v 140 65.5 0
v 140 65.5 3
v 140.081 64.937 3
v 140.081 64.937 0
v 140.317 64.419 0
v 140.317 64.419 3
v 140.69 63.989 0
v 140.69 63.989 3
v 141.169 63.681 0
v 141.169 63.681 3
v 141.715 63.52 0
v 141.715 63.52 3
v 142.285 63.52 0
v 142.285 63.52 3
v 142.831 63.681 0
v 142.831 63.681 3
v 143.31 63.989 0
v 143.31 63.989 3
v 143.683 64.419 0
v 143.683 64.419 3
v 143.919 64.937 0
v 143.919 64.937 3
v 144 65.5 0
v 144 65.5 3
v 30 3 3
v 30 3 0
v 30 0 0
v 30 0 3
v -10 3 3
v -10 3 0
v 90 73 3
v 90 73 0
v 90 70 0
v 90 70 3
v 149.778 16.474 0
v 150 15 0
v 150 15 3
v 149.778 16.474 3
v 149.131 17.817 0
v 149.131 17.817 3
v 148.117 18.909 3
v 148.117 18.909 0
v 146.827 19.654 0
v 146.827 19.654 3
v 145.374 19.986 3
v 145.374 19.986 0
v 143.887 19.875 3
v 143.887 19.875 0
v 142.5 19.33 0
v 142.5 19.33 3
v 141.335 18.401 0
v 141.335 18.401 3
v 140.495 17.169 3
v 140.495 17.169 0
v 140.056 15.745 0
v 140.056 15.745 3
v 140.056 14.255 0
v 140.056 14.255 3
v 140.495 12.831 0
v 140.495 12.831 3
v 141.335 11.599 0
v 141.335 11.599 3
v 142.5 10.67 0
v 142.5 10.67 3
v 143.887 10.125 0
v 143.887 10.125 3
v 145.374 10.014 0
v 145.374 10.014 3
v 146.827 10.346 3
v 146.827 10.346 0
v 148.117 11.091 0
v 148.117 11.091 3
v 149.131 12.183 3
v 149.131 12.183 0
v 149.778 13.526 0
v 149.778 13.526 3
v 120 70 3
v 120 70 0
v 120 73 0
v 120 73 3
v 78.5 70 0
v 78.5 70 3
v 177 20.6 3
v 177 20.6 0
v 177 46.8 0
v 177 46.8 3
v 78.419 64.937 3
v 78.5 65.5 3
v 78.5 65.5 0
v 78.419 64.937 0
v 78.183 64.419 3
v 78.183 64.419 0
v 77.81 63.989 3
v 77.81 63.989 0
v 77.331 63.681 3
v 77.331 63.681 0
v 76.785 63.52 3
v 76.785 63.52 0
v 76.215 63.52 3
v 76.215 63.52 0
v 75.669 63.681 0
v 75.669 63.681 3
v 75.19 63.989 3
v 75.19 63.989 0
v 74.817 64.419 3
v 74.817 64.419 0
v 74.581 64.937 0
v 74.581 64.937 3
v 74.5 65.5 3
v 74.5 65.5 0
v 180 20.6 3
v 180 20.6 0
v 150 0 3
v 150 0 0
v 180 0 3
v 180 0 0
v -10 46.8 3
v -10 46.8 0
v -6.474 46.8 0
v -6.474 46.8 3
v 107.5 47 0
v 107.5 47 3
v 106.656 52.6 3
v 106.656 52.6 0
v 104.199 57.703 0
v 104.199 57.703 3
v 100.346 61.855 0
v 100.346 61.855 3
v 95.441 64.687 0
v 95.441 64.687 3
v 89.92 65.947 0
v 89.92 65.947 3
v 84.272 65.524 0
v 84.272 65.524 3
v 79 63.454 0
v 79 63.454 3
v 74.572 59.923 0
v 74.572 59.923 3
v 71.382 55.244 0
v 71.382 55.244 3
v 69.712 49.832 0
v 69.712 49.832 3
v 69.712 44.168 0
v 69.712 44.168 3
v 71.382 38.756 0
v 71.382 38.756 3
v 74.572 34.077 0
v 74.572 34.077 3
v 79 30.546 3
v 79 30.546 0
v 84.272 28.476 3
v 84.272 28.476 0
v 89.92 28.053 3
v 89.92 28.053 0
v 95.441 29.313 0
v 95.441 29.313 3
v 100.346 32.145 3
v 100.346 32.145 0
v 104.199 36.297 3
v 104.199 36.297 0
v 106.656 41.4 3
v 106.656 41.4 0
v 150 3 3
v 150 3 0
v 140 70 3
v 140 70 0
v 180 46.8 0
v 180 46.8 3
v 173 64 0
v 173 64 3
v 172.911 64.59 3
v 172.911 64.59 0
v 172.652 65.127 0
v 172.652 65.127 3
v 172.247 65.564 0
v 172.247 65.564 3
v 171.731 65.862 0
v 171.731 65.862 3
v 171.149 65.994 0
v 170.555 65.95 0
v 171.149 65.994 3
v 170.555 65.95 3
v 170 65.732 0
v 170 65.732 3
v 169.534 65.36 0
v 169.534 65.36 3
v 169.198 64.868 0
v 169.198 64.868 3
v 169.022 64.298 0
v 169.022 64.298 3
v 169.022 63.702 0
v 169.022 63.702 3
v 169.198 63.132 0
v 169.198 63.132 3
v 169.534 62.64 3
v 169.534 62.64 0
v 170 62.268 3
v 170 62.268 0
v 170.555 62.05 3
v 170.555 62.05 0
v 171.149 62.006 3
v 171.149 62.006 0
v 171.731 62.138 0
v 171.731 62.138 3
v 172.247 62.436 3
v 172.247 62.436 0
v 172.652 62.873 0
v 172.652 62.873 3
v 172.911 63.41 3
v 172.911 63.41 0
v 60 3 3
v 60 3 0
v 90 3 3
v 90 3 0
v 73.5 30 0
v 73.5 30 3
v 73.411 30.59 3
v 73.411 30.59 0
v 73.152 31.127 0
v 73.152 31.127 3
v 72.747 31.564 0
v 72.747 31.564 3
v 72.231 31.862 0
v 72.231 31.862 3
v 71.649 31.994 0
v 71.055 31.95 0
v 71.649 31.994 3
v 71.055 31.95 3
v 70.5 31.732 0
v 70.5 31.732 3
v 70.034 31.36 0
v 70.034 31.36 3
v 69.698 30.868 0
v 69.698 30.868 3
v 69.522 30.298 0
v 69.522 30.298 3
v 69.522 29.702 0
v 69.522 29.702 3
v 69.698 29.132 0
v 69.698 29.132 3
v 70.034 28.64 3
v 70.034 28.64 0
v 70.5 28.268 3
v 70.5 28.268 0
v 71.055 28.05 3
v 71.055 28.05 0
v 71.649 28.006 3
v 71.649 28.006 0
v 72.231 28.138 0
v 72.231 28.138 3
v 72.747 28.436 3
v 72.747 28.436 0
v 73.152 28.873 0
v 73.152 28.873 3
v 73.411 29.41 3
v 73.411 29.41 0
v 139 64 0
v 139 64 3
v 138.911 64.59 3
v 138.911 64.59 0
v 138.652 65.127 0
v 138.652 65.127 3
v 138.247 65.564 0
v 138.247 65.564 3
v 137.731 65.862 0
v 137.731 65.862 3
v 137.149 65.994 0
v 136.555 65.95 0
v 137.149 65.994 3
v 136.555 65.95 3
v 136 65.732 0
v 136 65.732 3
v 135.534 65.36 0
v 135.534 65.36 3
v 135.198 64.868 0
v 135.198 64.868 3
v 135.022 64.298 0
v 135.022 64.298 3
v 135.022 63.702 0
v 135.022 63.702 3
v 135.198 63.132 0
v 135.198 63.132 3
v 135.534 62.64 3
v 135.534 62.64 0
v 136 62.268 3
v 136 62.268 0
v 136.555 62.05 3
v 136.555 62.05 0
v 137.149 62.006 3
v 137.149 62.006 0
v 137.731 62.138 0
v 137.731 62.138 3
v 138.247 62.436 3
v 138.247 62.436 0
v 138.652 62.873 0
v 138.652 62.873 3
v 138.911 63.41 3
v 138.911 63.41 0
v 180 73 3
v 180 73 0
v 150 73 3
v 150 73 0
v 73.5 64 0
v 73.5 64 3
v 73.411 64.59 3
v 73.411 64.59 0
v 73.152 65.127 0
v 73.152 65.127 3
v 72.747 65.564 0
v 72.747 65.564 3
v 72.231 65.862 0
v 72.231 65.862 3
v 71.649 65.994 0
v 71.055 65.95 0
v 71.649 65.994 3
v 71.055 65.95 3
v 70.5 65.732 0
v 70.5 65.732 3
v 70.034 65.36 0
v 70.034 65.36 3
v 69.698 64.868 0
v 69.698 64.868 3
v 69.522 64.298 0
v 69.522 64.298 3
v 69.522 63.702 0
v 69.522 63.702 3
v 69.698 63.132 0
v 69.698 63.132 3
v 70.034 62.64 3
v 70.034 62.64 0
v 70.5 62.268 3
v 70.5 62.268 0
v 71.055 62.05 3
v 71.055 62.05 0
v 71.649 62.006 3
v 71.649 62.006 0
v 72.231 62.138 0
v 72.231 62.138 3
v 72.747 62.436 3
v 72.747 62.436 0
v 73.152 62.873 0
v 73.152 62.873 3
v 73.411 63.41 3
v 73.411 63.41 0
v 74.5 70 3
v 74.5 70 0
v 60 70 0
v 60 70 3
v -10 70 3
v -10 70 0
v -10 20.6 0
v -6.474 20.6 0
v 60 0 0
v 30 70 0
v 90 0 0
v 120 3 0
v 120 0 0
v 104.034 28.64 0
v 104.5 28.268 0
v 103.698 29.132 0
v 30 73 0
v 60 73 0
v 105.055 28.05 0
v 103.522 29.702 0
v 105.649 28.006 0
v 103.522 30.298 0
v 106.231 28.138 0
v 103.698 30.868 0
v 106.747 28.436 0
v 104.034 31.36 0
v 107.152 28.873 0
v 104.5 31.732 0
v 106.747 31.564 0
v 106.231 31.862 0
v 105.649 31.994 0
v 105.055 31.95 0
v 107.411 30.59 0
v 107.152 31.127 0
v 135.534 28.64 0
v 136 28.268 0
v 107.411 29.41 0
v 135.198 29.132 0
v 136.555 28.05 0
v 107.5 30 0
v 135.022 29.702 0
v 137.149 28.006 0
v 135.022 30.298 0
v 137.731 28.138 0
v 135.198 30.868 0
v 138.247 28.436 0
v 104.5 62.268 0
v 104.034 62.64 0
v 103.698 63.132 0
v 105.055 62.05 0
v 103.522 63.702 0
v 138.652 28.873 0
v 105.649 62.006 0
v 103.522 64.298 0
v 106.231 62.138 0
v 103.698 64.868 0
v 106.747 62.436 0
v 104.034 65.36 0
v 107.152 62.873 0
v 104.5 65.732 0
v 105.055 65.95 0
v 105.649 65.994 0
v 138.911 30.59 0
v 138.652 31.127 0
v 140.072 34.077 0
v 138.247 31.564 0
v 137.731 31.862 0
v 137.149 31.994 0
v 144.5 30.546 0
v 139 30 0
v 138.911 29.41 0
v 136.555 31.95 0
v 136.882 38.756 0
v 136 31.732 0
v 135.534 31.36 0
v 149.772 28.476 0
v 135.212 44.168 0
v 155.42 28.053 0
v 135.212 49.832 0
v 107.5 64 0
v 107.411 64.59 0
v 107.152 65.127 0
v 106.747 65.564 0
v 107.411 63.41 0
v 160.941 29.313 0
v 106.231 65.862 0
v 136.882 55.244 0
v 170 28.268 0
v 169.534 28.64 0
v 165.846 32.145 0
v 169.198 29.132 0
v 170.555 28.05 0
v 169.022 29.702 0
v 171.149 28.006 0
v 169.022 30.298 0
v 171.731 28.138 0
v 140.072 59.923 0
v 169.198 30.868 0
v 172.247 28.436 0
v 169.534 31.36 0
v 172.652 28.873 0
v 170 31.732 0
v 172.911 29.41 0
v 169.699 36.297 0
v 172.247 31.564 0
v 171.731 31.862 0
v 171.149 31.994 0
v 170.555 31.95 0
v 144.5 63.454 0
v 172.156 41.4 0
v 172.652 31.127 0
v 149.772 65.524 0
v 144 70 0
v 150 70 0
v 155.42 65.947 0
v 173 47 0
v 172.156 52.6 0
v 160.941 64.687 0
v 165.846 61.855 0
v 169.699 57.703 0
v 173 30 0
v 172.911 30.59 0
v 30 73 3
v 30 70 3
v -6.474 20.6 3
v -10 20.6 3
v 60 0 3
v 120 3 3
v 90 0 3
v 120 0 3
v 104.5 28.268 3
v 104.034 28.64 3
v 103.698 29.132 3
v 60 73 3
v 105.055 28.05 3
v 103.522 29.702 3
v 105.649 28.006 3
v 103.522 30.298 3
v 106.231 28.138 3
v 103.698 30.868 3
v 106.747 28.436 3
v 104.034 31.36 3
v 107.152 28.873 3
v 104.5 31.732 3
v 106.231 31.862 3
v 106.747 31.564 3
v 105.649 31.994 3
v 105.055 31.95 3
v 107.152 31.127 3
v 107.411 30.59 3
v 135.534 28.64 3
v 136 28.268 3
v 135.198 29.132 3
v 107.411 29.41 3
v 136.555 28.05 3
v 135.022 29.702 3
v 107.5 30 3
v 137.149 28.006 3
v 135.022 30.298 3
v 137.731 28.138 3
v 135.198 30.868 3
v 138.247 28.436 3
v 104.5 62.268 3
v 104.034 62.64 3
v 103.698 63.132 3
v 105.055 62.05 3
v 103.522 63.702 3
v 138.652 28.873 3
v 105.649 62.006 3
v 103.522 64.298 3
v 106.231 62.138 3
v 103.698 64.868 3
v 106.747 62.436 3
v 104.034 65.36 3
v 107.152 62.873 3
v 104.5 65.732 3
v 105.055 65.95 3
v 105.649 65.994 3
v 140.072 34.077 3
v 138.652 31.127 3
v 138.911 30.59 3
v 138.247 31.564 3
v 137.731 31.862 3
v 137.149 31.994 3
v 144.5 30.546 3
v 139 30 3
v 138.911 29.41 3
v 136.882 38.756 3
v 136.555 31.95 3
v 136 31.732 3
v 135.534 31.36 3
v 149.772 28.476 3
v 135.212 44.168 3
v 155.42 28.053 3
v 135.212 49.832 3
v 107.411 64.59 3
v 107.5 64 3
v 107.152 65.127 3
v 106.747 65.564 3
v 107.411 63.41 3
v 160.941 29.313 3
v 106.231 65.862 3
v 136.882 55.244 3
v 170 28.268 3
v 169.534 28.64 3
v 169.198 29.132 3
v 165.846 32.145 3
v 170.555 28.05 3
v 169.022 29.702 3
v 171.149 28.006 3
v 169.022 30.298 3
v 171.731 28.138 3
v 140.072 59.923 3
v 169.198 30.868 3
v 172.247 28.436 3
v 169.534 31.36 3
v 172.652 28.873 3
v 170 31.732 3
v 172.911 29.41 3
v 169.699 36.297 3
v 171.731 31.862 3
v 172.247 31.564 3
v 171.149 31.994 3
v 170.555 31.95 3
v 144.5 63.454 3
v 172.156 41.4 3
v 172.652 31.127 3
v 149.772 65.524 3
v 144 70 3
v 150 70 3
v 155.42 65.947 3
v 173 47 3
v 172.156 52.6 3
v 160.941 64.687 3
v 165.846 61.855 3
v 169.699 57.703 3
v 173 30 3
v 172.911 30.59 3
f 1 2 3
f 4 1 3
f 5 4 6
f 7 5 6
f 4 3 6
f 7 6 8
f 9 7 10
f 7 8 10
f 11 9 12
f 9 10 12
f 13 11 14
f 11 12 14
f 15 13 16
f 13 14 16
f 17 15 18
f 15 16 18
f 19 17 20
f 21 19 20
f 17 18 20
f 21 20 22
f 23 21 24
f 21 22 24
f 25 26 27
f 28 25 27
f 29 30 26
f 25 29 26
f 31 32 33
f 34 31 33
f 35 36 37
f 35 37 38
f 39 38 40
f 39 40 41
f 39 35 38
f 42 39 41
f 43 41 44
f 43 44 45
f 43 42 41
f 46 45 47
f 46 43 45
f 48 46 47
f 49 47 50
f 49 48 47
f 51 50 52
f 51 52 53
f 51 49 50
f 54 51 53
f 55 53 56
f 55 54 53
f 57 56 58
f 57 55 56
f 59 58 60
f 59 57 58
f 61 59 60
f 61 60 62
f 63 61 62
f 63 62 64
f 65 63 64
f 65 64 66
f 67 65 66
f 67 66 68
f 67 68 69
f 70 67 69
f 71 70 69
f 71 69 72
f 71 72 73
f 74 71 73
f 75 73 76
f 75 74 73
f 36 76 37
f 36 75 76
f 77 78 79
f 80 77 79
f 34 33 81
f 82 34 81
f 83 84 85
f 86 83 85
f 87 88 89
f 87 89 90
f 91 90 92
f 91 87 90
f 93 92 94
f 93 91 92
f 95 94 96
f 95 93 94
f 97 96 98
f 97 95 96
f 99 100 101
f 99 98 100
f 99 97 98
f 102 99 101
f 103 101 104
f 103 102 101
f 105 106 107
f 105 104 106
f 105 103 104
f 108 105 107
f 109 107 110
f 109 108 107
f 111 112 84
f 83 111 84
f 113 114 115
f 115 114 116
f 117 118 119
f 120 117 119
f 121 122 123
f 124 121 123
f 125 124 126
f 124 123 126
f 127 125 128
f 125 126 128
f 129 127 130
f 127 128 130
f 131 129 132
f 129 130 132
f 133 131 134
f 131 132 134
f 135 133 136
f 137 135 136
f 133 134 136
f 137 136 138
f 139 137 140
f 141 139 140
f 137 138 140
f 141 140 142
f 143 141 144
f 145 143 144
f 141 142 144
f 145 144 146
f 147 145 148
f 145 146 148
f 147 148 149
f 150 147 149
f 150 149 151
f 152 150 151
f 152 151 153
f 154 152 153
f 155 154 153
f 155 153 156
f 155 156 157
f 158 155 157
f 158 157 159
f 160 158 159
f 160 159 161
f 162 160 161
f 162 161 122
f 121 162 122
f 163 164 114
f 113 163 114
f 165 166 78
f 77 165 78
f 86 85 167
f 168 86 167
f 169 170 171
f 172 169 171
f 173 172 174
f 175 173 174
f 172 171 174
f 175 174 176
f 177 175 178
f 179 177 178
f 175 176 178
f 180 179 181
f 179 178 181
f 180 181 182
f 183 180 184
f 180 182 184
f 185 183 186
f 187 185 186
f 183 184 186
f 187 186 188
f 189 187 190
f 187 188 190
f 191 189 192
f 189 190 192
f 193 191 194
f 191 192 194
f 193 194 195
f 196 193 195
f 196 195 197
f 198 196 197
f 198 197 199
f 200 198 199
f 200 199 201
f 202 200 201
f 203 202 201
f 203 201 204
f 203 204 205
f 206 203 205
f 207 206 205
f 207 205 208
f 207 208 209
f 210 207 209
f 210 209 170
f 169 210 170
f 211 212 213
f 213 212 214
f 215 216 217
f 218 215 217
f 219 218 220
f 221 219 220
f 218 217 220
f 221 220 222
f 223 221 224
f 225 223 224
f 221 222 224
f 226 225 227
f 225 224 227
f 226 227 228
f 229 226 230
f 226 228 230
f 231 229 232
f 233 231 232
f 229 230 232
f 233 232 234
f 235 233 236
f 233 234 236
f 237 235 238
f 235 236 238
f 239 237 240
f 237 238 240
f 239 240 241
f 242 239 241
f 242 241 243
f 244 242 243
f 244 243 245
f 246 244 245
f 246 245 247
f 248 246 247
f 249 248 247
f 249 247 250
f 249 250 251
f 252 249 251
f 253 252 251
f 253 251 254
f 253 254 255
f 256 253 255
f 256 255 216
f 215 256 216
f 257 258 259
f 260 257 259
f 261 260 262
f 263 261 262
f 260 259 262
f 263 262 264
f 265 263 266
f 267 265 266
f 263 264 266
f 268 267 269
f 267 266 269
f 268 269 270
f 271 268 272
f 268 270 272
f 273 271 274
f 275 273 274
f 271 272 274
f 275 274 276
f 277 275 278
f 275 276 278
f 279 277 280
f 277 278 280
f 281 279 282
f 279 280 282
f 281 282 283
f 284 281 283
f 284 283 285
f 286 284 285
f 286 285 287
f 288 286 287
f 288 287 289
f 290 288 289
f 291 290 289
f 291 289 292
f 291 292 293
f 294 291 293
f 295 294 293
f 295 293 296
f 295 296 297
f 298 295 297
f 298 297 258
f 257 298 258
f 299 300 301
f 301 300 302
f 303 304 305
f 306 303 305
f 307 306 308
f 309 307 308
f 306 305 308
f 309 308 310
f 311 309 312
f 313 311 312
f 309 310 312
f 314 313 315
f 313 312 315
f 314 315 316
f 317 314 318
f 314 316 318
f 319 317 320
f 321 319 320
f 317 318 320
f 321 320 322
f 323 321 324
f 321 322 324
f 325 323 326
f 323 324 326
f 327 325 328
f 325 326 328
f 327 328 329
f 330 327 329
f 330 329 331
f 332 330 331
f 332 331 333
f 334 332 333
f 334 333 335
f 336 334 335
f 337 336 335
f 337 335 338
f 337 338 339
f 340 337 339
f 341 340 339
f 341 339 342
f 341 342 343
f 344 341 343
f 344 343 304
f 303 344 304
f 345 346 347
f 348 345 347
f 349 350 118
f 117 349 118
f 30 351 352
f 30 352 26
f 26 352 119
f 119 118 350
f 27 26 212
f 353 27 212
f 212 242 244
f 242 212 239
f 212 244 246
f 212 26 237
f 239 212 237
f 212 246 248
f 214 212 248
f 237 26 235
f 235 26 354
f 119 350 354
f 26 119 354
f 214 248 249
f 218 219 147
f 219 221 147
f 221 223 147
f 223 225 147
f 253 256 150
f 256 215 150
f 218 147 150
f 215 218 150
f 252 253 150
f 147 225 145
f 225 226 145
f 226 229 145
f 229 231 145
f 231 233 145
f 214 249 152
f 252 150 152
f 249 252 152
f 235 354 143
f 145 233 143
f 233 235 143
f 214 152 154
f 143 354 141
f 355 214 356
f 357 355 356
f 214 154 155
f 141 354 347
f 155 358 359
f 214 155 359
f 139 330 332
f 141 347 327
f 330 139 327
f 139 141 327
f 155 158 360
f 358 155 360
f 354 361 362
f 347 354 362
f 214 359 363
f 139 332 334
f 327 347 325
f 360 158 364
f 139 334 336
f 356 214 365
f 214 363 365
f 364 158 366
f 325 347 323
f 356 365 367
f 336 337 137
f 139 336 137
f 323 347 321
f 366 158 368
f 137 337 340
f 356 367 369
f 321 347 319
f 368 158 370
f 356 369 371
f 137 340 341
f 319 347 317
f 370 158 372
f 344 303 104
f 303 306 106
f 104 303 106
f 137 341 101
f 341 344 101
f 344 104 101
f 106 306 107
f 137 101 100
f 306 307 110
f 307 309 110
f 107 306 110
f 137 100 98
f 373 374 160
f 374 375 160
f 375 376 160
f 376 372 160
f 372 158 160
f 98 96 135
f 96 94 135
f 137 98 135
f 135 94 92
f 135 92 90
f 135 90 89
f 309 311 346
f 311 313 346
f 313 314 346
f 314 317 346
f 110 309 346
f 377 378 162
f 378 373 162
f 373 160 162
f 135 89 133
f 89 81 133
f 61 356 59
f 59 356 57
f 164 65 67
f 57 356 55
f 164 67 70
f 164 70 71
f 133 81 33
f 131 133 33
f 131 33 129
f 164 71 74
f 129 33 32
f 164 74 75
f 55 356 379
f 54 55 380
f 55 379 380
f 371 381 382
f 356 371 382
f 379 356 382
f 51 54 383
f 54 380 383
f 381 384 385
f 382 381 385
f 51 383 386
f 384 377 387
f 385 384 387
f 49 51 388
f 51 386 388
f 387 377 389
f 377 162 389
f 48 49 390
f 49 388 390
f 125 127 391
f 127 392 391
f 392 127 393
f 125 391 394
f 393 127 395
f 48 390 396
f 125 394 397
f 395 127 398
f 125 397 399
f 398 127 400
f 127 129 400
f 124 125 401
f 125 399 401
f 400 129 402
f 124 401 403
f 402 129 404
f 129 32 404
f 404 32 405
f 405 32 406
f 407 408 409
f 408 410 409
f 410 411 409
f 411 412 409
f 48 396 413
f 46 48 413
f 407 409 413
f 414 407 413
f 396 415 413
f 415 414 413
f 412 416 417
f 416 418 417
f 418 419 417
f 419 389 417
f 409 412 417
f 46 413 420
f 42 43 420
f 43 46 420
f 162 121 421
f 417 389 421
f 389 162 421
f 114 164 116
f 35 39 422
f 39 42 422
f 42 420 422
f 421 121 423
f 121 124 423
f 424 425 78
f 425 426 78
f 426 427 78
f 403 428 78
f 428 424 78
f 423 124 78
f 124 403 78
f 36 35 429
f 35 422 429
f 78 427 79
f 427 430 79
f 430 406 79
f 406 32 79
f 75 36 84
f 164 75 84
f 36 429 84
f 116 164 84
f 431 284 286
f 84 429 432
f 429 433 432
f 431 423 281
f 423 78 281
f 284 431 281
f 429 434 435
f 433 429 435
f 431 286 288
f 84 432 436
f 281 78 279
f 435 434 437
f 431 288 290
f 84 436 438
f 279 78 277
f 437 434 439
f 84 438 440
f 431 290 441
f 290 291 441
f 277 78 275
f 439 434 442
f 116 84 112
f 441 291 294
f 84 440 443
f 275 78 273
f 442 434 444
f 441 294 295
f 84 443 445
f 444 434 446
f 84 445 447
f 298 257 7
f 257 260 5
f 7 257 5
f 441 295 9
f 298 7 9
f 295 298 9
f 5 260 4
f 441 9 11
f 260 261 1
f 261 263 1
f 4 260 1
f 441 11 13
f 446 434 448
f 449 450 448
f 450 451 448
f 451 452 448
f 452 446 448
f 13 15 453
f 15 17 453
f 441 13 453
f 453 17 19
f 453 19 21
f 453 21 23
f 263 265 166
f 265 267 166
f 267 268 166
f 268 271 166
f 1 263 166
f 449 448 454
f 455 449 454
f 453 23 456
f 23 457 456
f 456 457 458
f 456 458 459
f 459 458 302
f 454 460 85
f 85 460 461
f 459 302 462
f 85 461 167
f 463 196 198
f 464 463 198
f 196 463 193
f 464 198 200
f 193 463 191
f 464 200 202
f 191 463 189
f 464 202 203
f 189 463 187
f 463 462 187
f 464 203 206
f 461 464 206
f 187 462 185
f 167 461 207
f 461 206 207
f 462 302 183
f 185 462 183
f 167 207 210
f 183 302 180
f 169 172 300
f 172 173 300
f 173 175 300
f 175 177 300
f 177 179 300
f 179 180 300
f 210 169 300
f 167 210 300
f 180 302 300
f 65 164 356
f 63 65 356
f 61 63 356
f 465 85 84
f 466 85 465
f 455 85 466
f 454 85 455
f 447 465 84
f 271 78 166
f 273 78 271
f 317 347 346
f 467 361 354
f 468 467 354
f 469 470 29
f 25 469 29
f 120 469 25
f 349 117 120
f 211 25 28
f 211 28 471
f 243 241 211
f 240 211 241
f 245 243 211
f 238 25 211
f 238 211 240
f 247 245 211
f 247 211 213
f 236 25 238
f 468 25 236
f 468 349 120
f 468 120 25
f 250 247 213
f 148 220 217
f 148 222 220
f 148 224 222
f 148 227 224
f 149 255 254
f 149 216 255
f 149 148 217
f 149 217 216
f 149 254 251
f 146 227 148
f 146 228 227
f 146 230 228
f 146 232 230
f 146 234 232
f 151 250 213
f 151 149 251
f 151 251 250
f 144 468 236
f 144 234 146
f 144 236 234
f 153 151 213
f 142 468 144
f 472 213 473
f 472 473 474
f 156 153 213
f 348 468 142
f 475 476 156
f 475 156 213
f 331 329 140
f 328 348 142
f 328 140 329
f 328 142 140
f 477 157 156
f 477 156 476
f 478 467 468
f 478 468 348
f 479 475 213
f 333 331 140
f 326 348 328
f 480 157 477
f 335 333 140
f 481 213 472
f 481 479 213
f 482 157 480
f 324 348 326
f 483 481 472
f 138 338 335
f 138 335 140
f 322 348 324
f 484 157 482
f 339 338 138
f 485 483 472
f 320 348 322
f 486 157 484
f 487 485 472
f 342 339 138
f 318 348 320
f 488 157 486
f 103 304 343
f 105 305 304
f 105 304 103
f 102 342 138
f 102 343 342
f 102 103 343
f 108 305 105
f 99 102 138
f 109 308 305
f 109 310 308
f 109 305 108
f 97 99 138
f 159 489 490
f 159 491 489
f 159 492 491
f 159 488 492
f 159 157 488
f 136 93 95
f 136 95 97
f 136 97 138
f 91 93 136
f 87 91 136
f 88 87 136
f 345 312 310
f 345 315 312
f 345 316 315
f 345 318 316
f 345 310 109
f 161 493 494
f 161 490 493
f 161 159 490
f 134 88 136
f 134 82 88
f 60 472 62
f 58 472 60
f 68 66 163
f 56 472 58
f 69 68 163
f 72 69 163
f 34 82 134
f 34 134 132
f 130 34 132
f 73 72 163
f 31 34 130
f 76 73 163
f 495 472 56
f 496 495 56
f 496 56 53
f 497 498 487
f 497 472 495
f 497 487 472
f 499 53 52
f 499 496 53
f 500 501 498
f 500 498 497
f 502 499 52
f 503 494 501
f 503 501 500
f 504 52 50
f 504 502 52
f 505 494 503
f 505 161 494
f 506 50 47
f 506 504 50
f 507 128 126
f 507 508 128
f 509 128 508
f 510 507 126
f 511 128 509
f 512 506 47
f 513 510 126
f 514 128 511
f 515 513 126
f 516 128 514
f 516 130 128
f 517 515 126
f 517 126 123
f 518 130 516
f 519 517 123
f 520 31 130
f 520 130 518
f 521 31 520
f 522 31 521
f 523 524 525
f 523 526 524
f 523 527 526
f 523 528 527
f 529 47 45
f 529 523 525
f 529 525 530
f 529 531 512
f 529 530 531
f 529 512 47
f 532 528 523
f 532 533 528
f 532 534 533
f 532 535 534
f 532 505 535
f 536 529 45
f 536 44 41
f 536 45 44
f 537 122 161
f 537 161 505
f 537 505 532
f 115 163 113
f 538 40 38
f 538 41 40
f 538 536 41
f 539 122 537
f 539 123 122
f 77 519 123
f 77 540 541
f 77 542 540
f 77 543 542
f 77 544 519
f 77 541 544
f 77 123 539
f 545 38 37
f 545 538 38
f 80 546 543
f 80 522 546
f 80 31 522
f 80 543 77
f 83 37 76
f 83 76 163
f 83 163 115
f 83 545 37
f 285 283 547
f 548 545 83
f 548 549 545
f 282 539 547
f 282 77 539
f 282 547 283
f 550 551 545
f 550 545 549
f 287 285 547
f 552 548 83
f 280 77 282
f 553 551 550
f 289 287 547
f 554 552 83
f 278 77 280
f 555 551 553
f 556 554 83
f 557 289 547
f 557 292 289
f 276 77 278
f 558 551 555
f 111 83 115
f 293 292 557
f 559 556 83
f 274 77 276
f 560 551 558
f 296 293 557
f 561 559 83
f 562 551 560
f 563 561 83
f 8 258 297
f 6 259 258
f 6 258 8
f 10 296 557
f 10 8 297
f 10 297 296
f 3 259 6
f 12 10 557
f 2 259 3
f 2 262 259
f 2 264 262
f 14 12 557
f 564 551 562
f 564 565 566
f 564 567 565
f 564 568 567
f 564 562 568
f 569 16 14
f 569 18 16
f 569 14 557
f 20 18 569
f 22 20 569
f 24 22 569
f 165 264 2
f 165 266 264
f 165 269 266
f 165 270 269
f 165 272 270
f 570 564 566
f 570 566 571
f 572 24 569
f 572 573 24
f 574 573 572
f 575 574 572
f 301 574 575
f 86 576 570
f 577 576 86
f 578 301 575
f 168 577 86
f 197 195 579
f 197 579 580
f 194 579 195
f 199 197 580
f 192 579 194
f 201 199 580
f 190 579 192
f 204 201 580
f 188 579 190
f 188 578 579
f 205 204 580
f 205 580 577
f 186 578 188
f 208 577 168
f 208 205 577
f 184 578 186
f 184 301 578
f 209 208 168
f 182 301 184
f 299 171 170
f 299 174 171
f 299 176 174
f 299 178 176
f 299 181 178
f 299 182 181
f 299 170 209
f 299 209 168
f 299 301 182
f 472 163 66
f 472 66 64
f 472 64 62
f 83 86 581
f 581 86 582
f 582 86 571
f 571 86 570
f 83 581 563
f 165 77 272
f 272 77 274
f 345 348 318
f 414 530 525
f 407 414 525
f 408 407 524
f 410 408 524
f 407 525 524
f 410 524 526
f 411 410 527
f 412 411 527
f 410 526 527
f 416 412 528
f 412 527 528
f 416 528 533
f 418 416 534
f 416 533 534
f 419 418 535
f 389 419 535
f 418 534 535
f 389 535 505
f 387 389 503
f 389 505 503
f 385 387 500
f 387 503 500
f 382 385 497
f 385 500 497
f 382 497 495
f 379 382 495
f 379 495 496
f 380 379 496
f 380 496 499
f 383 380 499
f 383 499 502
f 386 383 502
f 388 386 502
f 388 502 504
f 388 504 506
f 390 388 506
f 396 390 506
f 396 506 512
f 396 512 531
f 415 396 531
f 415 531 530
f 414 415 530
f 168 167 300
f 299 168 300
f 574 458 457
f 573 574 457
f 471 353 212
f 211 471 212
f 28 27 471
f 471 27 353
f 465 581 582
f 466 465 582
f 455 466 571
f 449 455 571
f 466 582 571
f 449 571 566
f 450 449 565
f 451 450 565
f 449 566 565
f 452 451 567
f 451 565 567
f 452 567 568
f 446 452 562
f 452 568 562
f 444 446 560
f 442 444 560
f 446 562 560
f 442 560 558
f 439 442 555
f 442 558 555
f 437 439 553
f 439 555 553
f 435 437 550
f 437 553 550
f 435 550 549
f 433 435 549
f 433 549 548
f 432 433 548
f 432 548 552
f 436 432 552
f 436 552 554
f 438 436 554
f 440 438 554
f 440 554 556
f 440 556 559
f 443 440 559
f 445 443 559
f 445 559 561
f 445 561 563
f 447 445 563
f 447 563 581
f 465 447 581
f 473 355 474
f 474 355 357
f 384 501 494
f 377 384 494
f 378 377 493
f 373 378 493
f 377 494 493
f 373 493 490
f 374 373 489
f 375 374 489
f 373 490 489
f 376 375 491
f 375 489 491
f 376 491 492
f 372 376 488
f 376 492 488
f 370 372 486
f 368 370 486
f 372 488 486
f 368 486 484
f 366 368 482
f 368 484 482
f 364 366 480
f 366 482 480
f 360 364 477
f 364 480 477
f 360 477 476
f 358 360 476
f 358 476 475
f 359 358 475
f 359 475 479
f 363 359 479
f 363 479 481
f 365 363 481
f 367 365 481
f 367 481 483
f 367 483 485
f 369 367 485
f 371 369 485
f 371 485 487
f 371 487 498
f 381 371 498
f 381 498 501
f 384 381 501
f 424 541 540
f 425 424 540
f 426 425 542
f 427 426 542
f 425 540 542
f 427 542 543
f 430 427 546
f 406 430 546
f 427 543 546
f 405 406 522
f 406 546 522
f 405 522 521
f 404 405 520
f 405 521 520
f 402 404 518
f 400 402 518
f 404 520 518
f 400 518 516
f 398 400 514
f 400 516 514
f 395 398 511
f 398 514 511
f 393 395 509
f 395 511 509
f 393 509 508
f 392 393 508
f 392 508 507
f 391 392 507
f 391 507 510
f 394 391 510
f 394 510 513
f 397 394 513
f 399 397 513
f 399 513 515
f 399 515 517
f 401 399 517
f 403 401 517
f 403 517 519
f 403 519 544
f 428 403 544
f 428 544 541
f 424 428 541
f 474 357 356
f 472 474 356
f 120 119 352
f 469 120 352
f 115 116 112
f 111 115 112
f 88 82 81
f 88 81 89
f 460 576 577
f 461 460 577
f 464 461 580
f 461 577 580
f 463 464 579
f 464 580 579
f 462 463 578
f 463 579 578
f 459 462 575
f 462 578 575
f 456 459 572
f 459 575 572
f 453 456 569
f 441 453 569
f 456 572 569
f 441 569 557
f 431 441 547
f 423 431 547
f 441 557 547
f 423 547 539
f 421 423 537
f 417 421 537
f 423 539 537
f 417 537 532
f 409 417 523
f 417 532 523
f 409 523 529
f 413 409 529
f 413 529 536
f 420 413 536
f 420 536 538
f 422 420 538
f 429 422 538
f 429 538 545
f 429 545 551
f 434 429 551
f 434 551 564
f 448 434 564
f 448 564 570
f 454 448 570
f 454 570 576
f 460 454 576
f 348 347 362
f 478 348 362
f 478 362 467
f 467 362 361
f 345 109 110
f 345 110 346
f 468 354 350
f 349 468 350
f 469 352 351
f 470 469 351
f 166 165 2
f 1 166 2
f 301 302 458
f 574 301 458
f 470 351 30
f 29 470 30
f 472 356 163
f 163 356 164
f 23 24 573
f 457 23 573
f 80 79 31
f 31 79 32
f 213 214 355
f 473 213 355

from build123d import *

# Parameters (mm, degrees)
SKETCH1_R           = 5
BOSS_EXTRUDE1_DEPTH = 3
SKETCH2_R           = 2
SKETCH2_R_2         = 19
SKETCH2_W           = 4
SKETCH2_H           = 3
CUT_EXTRUDE1_DEPTH  = 10


with BuildPart() as part:
    # Sketch1 → Boss-Extrude1 (new body)
    with BuildSketch(Plane.XY):
        Polygon((30, 70), (0, 70), (-10, 70), (-10, 46.8), (-6.473616306, 46.8), (-6.473616306, 20.6), (-10, 20.6), (-10, 3), (0, 3), (30, 3), (30, 0), (60, 0), (60, 3), (90, 3), (90, 0), (120, 0), (120, 3), (150, 3), (150, 0), (180, 0), (180, 20.6), (177, 20.6), (177, 46.8), (180, 46.8), (180, 73), (150, 73), (150, 70), (120, 70), (120, 73), (90, 73), (90, 70), (60, 70), (60, 73), (30, 73), align=None)
        with Locations((145, 15)):
            Circle(SKETCH1_R, mode=Mode.SUBTRACT)
    extrude(amount=BOSS_EXTRUDE1_DEPTH)

    # Sketch2 → Cut-Extrude1 (cut)
    with BuildSketch(Plane.XY.offset(3)):
        with Locations((105.5, 64)):
            Circle(SKETCH2_R)
        with Locations((154, 47)):
            Circle(SKETCH2_R_2)
        with Locations((88.5, 47)):
            Circle(SKETCH2_R_2)
        with Locations((142, 68.5)):
            Rectangle(SKETCH2_W, SKETCH2_H)
        with BuildLine():
            Line((144, 67), (140, 67))
            Line((140, 67), (140, 65.5))
            ThreePointArc((140, 65.5), (142, 63.5), (144, 65.5))
            Line((144, 65.5), (144, 67))
        make_face()
        with Locations((71.5, 64)):
            Circle(SKETCH2_R)
        with Locations((71.5, 30)):
            Circle(SKETCH2_R)
        with Locations((105.5, 30)):
            Circle(SKETCH2_R)
        with Locations((137, 30)):
            Circle(SKETCH2_R)
        with Locations((171, 30)):
            Circle(SKETCH2_R)
        with Locations((171, 64)):
            Circle(SKETCH2_R)
        with Locations((137, 64)):
            Circle(SKETCH2_R)
        with BuildLine():
            Line((74.5, 70), (78.5, 70))
            Line((78.5, 70), (78.5, 65.5))
            ThreePointArc((78.5, 65.5), (76.5, 63.5), (74.5, 65.5))
            Line((74.5, 65.5), (74.5, 70))
        make_face()
    extrude(amount=-CUT_EXTRUDE1_DEPTH, mode=Mode.SUBTRACT)


solid = part.part
